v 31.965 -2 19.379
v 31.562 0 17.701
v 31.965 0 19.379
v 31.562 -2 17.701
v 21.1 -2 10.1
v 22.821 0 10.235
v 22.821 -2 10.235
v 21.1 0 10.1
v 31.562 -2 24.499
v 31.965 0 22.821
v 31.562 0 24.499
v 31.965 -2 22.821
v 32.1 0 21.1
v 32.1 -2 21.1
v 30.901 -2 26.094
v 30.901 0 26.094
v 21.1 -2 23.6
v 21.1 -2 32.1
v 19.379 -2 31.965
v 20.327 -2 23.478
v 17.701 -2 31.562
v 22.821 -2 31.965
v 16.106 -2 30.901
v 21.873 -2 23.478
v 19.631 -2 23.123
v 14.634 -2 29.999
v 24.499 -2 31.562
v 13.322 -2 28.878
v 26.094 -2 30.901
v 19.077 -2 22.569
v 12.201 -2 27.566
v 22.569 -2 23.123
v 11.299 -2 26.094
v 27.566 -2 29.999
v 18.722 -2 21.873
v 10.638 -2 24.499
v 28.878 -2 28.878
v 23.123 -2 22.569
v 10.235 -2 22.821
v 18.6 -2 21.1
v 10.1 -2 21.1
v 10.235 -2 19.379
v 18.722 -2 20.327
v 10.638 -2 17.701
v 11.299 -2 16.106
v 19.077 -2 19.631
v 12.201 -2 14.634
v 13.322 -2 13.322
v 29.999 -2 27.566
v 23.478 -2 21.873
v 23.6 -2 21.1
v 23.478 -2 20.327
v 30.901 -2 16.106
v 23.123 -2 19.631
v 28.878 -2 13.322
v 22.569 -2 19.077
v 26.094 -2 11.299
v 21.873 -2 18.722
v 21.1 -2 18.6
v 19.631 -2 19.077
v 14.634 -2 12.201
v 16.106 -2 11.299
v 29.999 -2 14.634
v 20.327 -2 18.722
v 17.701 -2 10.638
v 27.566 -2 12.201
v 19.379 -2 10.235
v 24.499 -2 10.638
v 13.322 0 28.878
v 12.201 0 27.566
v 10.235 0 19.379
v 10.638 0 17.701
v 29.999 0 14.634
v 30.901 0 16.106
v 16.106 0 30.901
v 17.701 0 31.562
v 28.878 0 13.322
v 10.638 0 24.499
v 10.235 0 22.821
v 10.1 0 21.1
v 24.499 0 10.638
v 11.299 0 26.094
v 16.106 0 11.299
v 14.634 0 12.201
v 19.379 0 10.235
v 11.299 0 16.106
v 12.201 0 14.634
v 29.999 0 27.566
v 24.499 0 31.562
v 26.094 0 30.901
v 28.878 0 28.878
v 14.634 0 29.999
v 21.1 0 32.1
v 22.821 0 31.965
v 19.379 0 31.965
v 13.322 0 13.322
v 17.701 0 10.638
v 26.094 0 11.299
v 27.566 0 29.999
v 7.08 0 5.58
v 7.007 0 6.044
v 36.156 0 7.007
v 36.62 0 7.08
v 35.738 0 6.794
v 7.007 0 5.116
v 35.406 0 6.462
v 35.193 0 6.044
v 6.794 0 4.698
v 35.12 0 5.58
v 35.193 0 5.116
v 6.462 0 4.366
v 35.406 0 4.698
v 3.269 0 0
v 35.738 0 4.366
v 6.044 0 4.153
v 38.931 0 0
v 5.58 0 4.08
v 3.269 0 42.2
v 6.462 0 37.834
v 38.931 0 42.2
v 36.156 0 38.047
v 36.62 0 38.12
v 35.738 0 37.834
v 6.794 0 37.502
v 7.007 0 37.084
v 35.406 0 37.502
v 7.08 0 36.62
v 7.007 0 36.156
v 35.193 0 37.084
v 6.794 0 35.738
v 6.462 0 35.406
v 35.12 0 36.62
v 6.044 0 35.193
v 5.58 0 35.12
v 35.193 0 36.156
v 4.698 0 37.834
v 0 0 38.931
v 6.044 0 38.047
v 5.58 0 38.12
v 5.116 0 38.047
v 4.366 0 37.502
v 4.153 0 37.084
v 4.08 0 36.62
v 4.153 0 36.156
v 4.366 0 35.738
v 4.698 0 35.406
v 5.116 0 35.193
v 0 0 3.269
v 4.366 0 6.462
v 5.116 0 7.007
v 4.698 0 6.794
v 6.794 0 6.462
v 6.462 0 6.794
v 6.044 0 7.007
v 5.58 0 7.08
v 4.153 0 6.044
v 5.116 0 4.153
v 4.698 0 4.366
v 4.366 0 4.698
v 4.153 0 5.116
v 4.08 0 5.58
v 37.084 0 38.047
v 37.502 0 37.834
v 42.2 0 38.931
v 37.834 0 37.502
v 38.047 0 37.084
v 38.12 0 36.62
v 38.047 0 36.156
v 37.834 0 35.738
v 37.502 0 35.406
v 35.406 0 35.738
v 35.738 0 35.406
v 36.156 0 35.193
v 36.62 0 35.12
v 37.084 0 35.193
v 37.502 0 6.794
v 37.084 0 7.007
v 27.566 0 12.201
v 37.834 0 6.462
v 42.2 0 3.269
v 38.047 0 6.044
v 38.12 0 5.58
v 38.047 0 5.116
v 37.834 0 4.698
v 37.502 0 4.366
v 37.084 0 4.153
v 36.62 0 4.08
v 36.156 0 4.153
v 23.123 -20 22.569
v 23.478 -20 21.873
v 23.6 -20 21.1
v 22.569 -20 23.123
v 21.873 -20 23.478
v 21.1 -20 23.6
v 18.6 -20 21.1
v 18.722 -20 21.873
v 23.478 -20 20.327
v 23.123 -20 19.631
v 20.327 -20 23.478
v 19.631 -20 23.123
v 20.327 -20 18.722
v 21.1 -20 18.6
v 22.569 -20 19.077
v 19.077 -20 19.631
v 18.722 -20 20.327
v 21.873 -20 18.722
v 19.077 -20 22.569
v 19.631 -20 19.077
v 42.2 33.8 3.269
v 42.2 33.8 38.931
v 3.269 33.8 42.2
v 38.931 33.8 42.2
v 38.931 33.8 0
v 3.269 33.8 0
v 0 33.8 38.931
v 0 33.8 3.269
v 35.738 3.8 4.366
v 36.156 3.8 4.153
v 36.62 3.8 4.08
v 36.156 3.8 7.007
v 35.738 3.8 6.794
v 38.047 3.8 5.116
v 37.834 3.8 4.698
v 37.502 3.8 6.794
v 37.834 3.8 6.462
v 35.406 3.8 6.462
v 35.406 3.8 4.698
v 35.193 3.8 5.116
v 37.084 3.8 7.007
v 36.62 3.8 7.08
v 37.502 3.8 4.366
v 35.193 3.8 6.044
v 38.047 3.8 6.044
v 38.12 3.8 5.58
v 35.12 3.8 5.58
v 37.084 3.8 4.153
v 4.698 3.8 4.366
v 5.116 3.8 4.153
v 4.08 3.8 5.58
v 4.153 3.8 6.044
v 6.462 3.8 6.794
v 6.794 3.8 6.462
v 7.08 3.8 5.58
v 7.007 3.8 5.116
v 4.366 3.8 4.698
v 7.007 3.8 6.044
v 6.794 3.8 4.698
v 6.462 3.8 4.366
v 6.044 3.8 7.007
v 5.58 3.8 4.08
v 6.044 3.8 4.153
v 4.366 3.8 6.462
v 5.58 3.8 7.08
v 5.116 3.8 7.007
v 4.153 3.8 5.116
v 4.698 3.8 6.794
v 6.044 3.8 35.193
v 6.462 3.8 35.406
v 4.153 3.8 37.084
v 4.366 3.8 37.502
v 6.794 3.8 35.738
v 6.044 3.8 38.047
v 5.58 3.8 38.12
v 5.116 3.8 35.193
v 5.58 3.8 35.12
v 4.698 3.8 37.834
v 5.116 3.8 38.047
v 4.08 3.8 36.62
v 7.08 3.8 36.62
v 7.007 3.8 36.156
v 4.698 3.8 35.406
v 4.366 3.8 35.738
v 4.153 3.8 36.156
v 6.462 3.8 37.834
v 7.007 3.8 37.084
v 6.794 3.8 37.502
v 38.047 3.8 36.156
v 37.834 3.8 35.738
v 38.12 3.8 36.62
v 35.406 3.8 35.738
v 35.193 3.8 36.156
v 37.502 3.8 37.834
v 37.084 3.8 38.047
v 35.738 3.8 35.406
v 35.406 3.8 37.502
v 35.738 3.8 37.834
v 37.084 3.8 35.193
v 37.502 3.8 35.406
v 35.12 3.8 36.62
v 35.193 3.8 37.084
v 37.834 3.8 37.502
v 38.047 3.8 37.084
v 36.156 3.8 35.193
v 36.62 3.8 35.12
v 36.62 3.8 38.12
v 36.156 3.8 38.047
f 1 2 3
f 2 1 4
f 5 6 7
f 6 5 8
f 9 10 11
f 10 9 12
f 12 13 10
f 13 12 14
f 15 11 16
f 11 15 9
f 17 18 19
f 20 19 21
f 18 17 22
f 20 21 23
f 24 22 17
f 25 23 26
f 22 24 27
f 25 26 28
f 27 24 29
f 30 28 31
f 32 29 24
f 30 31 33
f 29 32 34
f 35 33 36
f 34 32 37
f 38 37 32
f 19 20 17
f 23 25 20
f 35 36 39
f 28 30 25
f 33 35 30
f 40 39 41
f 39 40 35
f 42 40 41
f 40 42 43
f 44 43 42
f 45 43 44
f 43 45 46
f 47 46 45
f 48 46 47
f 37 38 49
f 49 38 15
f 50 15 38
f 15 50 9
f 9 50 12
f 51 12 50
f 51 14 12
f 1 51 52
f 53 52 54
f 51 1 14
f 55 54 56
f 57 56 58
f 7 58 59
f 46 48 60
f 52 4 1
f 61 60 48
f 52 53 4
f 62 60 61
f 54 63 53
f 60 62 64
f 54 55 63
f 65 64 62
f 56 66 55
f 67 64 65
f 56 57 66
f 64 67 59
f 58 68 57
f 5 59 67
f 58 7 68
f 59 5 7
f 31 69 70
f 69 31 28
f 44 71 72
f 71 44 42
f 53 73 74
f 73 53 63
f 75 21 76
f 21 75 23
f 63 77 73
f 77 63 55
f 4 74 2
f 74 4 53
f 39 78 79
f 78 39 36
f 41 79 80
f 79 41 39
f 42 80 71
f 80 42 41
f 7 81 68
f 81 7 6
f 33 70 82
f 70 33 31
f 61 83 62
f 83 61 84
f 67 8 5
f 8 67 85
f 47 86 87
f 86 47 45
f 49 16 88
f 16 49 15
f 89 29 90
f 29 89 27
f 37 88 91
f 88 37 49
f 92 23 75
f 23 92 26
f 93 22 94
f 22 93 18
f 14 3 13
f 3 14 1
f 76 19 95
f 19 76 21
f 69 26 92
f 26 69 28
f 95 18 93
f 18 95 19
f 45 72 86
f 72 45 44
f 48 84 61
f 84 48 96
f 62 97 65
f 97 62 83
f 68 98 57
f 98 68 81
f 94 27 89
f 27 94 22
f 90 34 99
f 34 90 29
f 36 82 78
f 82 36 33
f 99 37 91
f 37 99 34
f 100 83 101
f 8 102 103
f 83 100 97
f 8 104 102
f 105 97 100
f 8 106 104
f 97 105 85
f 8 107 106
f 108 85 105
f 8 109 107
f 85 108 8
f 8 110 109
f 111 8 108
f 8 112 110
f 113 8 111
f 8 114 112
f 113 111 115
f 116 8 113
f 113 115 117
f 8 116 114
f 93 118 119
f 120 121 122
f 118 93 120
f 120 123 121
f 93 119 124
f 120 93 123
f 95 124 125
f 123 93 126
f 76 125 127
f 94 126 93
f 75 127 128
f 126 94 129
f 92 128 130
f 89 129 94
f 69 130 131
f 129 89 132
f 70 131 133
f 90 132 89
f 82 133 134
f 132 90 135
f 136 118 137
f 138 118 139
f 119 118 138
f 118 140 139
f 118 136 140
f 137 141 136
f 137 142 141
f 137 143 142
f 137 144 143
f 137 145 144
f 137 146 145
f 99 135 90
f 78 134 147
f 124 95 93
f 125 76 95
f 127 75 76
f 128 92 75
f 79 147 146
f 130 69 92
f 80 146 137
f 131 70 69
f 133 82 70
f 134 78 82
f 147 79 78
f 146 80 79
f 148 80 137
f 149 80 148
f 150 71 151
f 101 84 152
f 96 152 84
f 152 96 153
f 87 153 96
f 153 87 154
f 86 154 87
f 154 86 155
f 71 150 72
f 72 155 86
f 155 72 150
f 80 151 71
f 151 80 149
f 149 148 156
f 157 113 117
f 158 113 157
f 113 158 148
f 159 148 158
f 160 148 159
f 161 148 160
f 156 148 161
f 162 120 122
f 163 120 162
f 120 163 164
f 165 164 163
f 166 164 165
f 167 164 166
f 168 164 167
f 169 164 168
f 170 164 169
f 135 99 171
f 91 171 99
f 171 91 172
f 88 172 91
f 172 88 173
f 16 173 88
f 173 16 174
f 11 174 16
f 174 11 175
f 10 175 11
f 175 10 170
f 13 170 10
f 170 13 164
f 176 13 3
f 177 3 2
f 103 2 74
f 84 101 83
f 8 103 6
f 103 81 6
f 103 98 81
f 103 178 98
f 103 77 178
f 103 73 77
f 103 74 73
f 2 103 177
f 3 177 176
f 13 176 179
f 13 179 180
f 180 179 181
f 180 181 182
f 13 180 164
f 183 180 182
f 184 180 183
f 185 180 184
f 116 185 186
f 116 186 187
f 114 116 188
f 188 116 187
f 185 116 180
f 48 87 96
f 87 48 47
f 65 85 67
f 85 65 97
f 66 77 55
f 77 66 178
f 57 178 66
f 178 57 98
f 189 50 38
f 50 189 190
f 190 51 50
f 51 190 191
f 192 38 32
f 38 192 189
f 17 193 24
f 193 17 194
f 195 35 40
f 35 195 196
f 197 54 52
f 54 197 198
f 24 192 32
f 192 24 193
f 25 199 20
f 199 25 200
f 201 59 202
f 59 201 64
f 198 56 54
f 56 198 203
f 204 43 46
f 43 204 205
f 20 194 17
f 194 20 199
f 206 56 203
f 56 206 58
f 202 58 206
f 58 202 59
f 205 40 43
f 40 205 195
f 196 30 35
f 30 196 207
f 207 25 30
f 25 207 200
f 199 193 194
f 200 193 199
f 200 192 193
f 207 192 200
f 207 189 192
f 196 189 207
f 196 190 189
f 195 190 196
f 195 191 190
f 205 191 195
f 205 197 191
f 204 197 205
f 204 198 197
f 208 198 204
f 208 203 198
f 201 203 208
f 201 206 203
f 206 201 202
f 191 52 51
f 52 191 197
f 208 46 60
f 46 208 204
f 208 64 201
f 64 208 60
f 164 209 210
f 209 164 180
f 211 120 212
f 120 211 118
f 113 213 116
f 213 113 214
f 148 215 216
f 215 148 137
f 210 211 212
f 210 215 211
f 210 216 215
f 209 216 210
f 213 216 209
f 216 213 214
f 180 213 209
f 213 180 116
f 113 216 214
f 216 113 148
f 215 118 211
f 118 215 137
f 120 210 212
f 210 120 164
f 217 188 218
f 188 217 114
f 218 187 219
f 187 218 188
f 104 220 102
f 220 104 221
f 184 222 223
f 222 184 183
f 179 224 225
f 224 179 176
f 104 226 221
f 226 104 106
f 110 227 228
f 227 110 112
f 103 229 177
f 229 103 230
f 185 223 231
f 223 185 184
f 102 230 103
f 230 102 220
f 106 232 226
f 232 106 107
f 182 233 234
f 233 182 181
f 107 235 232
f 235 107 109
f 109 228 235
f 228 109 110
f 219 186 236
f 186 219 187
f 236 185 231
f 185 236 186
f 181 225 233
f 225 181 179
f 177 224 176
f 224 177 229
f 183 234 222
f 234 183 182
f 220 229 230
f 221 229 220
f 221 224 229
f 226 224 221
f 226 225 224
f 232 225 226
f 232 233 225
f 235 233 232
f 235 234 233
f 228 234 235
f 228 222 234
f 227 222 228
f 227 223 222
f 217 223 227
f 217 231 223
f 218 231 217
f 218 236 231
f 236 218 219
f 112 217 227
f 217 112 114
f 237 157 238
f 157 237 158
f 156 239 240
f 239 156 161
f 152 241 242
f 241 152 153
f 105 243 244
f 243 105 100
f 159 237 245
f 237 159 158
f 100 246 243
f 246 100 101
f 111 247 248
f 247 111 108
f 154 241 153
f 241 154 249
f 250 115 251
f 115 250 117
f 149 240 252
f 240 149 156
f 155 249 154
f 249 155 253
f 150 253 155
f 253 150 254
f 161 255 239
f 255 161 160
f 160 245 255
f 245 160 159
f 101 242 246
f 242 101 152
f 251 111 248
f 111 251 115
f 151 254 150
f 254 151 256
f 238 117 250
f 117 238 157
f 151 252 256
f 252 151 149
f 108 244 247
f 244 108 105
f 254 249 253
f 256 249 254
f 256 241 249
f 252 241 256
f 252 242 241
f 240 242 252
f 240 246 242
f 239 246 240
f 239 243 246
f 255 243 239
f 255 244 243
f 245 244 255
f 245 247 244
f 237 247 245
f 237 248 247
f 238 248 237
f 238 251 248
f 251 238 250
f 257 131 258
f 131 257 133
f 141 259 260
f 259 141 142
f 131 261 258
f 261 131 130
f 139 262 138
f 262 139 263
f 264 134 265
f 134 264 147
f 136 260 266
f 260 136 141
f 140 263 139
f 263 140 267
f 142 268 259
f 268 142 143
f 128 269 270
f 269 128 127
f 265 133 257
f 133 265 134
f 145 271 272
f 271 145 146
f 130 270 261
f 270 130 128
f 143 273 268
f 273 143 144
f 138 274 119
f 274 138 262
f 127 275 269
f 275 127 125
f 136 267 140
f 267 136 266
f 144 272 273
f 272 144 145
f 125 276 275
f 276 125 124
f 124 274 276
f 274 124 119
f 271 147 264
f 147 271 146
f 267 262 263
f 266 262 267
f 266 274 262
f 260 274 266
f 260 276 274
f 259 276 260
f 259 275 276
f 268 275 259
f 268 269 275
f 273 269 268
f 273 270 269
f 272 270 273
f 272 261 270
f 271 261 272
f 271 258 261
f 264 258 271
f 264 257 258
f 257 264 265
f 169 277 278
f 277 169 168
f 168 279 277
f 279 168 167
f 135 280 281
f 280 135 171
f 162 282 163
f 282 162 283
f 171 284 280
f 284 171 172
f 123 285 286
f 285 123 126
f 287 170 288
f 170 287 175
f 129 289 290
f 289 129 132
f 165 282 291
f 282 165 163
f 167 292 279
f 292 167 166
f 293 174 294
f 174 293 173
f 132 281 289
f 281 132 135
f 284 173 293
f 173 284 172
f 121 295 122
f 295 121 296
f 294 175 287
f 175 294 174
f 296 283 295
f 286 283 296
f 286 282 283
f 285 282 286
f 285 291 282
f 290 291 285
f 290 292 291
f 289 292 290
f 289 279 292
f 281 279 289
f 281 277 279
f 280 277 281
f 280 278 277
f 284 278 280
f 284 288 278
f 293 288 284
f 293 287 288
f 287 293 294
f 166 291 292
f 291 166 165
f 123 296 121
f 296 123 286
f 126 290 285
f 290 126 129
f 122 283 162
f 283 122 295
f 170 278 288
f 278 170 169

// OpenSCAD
module Nema17()
{
	nema_side = 42.2;
	nema_bolts = 31.04/2.0;
	nema_depth = 3.8;
	M3 = 3.0/2.0;

	//bevel corners
	r1 = nema_side/2- nema_bolts;
	r2 = sqrt(2)* r1 ;
	r=(r2-r1)*2;
	
	
	difference()
	{
	
		union()
		{
			cube([nema_side,33.8,nema_side]);
	
			translate( [nema_side/2,0,nema_side/2]) 
				rotate(90,[1,0,0]) 
					{
						cylinder(r = 11, h = 2, $fn = 40);
						cylinder(r = 5.0/2.0, h = 20, $fn = 20);
					}
		}
	
	
		translate( [nema_side/2,0,nema_side/2])
		{
	
			for(j=[1:4])
			{
				rotate(90*j,[0,1,0]) 
					translate( [nema_side/2,33.8/2,nema_side/2]) 
				rotate(45,[0,1,0]) 
				cube([30,50,r], center = true);
			}
	
			//bolt holes
			for(j=[1:4])
			{		
				rotate(90*j,[0,1,0]) 
				translate( [nema_bolts,0,nema_bolts]) 
					rotate(-90,[1,0,0]) 
					{
						cylinder(r = M3, h = nema_depth*2, $fn = 20,center=true);
					}
	
			}
		}
	}
}
	
	
Nema17();
